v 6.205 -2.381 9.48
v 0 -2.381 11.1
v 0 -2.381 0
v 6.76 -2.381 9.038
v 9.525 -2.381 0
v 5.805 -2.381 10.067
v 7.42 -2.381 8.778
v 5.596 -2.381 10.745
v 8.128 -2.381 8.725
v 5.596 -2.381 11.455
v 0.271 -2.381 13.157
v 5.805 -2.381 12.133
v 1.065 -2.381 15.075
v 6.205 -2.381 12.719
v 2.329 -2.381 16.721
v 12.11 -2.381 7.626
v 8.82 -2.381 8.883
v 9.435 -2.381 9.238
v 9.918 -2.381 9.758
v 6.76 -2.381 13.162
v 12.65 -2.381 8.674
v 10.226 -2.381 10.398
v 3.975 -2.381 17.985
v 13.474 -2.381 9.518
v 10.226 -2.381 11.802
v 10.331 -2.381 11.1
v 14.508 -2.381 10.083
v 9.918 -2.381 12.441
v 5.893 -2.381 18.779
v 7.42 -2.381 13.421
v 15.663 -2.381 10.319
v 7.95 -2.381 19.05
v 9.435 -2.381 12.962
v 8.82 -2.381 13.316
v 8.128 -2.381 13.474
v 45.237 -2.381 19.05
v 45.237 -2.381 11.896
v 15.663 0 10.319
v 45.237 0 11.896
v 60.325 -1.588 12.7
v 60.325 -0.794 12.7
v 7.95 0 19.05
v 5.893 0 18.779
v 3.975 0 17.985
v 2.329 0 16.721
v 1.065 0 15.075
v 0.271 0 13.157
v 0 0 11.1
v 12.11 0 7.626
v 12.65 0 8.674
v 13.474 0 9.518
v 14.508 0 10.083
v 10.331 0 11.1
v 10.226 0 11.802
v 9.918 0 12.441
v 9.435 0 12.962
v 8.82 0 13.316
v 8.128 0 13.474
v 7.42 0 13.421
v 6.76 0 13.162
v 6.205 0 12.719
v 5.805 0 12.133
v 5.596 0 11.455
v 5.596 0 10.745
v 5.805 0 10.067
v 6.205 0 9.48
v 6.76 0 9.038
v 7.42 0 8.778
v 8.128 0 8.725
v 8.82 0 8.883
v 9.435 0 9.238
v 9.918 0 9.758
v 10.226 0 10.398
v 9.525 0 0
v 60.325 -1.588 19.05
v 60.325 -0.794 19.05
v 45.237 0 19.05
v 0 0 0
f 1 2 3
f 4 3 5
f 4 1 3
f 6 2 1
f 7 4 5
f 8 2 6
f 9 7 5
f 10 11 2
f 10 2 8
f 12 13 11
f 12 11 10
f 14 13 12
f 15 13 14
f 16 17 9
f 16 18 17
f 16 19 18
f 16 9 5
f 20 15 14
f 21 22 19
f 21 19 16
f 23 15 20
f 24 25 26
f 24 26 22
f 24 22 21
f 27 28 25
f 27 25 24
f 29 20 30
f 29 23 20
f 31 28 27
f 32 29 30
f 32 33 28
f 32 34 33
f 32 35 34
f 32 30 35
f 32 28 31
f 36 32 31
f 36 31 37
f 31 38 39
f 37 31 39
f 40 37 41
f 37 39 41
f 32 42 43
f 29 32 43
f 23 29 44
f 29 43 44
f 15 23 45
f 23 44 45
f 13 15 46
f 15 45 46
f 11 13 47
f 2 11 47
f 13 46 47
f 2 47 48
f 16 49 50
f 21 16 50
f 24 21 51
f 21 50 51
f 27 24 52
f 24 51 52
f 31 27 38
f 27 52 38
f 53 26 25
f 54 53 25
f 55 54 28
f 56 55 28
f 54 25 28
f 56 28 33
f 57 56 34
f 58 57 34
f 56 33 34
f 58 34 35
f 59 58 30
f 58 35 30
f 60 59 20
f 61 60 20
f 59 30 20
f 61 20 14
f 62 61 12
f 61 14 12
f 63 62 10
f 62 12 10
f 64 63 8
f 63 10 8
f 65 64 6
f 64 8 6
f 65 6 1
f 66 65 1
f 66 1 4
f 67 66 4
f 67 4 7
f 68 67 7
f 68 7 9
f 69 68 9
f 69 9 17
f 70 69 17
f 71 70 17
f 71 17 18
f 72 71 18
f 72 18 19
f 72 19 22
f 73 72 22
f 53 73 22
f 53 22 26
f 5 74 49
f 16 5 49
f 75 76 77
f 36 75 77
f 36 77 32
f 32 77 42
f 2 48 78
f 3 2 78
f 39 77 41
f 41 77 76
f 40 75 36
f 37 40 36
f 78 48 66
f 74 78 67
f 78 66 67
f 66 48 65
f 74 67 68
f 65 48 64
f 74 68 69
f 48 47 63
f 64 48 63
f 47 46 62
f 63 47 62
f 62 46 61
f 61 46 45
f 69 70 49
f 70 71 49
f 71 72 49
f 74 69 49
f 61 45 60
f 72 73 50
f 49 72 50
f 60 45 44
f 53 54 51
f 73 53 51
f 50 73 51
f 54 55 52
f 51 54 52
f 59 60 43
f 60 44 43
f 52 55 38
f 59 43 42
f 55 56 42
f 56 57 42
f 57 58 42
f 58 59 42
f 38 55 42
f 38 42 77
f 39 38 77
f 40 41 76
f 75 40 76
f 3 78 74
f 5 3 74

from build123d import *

# Parameters (mm, degrees)
F1_DEPTH = 2.38125
F2_R     = 2.38125
F3_DEPTH = 25.4
F5_DEPTH = 25.4


with BuildPart() as f1:
    # F0 (on Front) → F1 (new body)
    with BuildSketch(Plane.XZ):
        with BuildLine():
            Line((60.325, 19.05), (7.9502, 19.05))
            ThreePointArc((7.9502, 19.05), (2.32856, 16.72144), (0, 11.0998))
            Line((0, 11.0998), (0, 0))
            Line((0, 0), (9.525, 0))
            Line((9.525, 0), (12.110345, 7.626242))
            ThreePointArc((12.110345, 7.626242), (13.473756, 9.517878), (15.663421, 10.319465))
            Line((15.663421, 10.319465), (60.325, 12.7))
            Line((60.325, 12.7), (60.325, 19.05))
        make_face()
    extrude(amount=F1_DEPTH)

    # F2 (on face) → F3 (cut)
    with BuildSketch(Plane.XZ.offset(2.38125)):
        with Locations((7.9502, 11.0998)):
            Circle(F2_R)
    extrude(amount=-F3_DEPTH, mode=Mode.SUBTRACT)

    # F4 (on face) → F5 (cut)
    with BuildSketch(Plane.XY.offset(19.05)):
        Polygon((60.325, 0), (45.2374, 0), (60.325, -0.79375), align=None)
        Polygon((60.325, -2.38125), (60.325, -1.5875), (45.2374, -2.38125), align=None)
    extrude(amount=-F5_DEPTH, mode=Mode.SUBTRACT)


solid = f1.part
